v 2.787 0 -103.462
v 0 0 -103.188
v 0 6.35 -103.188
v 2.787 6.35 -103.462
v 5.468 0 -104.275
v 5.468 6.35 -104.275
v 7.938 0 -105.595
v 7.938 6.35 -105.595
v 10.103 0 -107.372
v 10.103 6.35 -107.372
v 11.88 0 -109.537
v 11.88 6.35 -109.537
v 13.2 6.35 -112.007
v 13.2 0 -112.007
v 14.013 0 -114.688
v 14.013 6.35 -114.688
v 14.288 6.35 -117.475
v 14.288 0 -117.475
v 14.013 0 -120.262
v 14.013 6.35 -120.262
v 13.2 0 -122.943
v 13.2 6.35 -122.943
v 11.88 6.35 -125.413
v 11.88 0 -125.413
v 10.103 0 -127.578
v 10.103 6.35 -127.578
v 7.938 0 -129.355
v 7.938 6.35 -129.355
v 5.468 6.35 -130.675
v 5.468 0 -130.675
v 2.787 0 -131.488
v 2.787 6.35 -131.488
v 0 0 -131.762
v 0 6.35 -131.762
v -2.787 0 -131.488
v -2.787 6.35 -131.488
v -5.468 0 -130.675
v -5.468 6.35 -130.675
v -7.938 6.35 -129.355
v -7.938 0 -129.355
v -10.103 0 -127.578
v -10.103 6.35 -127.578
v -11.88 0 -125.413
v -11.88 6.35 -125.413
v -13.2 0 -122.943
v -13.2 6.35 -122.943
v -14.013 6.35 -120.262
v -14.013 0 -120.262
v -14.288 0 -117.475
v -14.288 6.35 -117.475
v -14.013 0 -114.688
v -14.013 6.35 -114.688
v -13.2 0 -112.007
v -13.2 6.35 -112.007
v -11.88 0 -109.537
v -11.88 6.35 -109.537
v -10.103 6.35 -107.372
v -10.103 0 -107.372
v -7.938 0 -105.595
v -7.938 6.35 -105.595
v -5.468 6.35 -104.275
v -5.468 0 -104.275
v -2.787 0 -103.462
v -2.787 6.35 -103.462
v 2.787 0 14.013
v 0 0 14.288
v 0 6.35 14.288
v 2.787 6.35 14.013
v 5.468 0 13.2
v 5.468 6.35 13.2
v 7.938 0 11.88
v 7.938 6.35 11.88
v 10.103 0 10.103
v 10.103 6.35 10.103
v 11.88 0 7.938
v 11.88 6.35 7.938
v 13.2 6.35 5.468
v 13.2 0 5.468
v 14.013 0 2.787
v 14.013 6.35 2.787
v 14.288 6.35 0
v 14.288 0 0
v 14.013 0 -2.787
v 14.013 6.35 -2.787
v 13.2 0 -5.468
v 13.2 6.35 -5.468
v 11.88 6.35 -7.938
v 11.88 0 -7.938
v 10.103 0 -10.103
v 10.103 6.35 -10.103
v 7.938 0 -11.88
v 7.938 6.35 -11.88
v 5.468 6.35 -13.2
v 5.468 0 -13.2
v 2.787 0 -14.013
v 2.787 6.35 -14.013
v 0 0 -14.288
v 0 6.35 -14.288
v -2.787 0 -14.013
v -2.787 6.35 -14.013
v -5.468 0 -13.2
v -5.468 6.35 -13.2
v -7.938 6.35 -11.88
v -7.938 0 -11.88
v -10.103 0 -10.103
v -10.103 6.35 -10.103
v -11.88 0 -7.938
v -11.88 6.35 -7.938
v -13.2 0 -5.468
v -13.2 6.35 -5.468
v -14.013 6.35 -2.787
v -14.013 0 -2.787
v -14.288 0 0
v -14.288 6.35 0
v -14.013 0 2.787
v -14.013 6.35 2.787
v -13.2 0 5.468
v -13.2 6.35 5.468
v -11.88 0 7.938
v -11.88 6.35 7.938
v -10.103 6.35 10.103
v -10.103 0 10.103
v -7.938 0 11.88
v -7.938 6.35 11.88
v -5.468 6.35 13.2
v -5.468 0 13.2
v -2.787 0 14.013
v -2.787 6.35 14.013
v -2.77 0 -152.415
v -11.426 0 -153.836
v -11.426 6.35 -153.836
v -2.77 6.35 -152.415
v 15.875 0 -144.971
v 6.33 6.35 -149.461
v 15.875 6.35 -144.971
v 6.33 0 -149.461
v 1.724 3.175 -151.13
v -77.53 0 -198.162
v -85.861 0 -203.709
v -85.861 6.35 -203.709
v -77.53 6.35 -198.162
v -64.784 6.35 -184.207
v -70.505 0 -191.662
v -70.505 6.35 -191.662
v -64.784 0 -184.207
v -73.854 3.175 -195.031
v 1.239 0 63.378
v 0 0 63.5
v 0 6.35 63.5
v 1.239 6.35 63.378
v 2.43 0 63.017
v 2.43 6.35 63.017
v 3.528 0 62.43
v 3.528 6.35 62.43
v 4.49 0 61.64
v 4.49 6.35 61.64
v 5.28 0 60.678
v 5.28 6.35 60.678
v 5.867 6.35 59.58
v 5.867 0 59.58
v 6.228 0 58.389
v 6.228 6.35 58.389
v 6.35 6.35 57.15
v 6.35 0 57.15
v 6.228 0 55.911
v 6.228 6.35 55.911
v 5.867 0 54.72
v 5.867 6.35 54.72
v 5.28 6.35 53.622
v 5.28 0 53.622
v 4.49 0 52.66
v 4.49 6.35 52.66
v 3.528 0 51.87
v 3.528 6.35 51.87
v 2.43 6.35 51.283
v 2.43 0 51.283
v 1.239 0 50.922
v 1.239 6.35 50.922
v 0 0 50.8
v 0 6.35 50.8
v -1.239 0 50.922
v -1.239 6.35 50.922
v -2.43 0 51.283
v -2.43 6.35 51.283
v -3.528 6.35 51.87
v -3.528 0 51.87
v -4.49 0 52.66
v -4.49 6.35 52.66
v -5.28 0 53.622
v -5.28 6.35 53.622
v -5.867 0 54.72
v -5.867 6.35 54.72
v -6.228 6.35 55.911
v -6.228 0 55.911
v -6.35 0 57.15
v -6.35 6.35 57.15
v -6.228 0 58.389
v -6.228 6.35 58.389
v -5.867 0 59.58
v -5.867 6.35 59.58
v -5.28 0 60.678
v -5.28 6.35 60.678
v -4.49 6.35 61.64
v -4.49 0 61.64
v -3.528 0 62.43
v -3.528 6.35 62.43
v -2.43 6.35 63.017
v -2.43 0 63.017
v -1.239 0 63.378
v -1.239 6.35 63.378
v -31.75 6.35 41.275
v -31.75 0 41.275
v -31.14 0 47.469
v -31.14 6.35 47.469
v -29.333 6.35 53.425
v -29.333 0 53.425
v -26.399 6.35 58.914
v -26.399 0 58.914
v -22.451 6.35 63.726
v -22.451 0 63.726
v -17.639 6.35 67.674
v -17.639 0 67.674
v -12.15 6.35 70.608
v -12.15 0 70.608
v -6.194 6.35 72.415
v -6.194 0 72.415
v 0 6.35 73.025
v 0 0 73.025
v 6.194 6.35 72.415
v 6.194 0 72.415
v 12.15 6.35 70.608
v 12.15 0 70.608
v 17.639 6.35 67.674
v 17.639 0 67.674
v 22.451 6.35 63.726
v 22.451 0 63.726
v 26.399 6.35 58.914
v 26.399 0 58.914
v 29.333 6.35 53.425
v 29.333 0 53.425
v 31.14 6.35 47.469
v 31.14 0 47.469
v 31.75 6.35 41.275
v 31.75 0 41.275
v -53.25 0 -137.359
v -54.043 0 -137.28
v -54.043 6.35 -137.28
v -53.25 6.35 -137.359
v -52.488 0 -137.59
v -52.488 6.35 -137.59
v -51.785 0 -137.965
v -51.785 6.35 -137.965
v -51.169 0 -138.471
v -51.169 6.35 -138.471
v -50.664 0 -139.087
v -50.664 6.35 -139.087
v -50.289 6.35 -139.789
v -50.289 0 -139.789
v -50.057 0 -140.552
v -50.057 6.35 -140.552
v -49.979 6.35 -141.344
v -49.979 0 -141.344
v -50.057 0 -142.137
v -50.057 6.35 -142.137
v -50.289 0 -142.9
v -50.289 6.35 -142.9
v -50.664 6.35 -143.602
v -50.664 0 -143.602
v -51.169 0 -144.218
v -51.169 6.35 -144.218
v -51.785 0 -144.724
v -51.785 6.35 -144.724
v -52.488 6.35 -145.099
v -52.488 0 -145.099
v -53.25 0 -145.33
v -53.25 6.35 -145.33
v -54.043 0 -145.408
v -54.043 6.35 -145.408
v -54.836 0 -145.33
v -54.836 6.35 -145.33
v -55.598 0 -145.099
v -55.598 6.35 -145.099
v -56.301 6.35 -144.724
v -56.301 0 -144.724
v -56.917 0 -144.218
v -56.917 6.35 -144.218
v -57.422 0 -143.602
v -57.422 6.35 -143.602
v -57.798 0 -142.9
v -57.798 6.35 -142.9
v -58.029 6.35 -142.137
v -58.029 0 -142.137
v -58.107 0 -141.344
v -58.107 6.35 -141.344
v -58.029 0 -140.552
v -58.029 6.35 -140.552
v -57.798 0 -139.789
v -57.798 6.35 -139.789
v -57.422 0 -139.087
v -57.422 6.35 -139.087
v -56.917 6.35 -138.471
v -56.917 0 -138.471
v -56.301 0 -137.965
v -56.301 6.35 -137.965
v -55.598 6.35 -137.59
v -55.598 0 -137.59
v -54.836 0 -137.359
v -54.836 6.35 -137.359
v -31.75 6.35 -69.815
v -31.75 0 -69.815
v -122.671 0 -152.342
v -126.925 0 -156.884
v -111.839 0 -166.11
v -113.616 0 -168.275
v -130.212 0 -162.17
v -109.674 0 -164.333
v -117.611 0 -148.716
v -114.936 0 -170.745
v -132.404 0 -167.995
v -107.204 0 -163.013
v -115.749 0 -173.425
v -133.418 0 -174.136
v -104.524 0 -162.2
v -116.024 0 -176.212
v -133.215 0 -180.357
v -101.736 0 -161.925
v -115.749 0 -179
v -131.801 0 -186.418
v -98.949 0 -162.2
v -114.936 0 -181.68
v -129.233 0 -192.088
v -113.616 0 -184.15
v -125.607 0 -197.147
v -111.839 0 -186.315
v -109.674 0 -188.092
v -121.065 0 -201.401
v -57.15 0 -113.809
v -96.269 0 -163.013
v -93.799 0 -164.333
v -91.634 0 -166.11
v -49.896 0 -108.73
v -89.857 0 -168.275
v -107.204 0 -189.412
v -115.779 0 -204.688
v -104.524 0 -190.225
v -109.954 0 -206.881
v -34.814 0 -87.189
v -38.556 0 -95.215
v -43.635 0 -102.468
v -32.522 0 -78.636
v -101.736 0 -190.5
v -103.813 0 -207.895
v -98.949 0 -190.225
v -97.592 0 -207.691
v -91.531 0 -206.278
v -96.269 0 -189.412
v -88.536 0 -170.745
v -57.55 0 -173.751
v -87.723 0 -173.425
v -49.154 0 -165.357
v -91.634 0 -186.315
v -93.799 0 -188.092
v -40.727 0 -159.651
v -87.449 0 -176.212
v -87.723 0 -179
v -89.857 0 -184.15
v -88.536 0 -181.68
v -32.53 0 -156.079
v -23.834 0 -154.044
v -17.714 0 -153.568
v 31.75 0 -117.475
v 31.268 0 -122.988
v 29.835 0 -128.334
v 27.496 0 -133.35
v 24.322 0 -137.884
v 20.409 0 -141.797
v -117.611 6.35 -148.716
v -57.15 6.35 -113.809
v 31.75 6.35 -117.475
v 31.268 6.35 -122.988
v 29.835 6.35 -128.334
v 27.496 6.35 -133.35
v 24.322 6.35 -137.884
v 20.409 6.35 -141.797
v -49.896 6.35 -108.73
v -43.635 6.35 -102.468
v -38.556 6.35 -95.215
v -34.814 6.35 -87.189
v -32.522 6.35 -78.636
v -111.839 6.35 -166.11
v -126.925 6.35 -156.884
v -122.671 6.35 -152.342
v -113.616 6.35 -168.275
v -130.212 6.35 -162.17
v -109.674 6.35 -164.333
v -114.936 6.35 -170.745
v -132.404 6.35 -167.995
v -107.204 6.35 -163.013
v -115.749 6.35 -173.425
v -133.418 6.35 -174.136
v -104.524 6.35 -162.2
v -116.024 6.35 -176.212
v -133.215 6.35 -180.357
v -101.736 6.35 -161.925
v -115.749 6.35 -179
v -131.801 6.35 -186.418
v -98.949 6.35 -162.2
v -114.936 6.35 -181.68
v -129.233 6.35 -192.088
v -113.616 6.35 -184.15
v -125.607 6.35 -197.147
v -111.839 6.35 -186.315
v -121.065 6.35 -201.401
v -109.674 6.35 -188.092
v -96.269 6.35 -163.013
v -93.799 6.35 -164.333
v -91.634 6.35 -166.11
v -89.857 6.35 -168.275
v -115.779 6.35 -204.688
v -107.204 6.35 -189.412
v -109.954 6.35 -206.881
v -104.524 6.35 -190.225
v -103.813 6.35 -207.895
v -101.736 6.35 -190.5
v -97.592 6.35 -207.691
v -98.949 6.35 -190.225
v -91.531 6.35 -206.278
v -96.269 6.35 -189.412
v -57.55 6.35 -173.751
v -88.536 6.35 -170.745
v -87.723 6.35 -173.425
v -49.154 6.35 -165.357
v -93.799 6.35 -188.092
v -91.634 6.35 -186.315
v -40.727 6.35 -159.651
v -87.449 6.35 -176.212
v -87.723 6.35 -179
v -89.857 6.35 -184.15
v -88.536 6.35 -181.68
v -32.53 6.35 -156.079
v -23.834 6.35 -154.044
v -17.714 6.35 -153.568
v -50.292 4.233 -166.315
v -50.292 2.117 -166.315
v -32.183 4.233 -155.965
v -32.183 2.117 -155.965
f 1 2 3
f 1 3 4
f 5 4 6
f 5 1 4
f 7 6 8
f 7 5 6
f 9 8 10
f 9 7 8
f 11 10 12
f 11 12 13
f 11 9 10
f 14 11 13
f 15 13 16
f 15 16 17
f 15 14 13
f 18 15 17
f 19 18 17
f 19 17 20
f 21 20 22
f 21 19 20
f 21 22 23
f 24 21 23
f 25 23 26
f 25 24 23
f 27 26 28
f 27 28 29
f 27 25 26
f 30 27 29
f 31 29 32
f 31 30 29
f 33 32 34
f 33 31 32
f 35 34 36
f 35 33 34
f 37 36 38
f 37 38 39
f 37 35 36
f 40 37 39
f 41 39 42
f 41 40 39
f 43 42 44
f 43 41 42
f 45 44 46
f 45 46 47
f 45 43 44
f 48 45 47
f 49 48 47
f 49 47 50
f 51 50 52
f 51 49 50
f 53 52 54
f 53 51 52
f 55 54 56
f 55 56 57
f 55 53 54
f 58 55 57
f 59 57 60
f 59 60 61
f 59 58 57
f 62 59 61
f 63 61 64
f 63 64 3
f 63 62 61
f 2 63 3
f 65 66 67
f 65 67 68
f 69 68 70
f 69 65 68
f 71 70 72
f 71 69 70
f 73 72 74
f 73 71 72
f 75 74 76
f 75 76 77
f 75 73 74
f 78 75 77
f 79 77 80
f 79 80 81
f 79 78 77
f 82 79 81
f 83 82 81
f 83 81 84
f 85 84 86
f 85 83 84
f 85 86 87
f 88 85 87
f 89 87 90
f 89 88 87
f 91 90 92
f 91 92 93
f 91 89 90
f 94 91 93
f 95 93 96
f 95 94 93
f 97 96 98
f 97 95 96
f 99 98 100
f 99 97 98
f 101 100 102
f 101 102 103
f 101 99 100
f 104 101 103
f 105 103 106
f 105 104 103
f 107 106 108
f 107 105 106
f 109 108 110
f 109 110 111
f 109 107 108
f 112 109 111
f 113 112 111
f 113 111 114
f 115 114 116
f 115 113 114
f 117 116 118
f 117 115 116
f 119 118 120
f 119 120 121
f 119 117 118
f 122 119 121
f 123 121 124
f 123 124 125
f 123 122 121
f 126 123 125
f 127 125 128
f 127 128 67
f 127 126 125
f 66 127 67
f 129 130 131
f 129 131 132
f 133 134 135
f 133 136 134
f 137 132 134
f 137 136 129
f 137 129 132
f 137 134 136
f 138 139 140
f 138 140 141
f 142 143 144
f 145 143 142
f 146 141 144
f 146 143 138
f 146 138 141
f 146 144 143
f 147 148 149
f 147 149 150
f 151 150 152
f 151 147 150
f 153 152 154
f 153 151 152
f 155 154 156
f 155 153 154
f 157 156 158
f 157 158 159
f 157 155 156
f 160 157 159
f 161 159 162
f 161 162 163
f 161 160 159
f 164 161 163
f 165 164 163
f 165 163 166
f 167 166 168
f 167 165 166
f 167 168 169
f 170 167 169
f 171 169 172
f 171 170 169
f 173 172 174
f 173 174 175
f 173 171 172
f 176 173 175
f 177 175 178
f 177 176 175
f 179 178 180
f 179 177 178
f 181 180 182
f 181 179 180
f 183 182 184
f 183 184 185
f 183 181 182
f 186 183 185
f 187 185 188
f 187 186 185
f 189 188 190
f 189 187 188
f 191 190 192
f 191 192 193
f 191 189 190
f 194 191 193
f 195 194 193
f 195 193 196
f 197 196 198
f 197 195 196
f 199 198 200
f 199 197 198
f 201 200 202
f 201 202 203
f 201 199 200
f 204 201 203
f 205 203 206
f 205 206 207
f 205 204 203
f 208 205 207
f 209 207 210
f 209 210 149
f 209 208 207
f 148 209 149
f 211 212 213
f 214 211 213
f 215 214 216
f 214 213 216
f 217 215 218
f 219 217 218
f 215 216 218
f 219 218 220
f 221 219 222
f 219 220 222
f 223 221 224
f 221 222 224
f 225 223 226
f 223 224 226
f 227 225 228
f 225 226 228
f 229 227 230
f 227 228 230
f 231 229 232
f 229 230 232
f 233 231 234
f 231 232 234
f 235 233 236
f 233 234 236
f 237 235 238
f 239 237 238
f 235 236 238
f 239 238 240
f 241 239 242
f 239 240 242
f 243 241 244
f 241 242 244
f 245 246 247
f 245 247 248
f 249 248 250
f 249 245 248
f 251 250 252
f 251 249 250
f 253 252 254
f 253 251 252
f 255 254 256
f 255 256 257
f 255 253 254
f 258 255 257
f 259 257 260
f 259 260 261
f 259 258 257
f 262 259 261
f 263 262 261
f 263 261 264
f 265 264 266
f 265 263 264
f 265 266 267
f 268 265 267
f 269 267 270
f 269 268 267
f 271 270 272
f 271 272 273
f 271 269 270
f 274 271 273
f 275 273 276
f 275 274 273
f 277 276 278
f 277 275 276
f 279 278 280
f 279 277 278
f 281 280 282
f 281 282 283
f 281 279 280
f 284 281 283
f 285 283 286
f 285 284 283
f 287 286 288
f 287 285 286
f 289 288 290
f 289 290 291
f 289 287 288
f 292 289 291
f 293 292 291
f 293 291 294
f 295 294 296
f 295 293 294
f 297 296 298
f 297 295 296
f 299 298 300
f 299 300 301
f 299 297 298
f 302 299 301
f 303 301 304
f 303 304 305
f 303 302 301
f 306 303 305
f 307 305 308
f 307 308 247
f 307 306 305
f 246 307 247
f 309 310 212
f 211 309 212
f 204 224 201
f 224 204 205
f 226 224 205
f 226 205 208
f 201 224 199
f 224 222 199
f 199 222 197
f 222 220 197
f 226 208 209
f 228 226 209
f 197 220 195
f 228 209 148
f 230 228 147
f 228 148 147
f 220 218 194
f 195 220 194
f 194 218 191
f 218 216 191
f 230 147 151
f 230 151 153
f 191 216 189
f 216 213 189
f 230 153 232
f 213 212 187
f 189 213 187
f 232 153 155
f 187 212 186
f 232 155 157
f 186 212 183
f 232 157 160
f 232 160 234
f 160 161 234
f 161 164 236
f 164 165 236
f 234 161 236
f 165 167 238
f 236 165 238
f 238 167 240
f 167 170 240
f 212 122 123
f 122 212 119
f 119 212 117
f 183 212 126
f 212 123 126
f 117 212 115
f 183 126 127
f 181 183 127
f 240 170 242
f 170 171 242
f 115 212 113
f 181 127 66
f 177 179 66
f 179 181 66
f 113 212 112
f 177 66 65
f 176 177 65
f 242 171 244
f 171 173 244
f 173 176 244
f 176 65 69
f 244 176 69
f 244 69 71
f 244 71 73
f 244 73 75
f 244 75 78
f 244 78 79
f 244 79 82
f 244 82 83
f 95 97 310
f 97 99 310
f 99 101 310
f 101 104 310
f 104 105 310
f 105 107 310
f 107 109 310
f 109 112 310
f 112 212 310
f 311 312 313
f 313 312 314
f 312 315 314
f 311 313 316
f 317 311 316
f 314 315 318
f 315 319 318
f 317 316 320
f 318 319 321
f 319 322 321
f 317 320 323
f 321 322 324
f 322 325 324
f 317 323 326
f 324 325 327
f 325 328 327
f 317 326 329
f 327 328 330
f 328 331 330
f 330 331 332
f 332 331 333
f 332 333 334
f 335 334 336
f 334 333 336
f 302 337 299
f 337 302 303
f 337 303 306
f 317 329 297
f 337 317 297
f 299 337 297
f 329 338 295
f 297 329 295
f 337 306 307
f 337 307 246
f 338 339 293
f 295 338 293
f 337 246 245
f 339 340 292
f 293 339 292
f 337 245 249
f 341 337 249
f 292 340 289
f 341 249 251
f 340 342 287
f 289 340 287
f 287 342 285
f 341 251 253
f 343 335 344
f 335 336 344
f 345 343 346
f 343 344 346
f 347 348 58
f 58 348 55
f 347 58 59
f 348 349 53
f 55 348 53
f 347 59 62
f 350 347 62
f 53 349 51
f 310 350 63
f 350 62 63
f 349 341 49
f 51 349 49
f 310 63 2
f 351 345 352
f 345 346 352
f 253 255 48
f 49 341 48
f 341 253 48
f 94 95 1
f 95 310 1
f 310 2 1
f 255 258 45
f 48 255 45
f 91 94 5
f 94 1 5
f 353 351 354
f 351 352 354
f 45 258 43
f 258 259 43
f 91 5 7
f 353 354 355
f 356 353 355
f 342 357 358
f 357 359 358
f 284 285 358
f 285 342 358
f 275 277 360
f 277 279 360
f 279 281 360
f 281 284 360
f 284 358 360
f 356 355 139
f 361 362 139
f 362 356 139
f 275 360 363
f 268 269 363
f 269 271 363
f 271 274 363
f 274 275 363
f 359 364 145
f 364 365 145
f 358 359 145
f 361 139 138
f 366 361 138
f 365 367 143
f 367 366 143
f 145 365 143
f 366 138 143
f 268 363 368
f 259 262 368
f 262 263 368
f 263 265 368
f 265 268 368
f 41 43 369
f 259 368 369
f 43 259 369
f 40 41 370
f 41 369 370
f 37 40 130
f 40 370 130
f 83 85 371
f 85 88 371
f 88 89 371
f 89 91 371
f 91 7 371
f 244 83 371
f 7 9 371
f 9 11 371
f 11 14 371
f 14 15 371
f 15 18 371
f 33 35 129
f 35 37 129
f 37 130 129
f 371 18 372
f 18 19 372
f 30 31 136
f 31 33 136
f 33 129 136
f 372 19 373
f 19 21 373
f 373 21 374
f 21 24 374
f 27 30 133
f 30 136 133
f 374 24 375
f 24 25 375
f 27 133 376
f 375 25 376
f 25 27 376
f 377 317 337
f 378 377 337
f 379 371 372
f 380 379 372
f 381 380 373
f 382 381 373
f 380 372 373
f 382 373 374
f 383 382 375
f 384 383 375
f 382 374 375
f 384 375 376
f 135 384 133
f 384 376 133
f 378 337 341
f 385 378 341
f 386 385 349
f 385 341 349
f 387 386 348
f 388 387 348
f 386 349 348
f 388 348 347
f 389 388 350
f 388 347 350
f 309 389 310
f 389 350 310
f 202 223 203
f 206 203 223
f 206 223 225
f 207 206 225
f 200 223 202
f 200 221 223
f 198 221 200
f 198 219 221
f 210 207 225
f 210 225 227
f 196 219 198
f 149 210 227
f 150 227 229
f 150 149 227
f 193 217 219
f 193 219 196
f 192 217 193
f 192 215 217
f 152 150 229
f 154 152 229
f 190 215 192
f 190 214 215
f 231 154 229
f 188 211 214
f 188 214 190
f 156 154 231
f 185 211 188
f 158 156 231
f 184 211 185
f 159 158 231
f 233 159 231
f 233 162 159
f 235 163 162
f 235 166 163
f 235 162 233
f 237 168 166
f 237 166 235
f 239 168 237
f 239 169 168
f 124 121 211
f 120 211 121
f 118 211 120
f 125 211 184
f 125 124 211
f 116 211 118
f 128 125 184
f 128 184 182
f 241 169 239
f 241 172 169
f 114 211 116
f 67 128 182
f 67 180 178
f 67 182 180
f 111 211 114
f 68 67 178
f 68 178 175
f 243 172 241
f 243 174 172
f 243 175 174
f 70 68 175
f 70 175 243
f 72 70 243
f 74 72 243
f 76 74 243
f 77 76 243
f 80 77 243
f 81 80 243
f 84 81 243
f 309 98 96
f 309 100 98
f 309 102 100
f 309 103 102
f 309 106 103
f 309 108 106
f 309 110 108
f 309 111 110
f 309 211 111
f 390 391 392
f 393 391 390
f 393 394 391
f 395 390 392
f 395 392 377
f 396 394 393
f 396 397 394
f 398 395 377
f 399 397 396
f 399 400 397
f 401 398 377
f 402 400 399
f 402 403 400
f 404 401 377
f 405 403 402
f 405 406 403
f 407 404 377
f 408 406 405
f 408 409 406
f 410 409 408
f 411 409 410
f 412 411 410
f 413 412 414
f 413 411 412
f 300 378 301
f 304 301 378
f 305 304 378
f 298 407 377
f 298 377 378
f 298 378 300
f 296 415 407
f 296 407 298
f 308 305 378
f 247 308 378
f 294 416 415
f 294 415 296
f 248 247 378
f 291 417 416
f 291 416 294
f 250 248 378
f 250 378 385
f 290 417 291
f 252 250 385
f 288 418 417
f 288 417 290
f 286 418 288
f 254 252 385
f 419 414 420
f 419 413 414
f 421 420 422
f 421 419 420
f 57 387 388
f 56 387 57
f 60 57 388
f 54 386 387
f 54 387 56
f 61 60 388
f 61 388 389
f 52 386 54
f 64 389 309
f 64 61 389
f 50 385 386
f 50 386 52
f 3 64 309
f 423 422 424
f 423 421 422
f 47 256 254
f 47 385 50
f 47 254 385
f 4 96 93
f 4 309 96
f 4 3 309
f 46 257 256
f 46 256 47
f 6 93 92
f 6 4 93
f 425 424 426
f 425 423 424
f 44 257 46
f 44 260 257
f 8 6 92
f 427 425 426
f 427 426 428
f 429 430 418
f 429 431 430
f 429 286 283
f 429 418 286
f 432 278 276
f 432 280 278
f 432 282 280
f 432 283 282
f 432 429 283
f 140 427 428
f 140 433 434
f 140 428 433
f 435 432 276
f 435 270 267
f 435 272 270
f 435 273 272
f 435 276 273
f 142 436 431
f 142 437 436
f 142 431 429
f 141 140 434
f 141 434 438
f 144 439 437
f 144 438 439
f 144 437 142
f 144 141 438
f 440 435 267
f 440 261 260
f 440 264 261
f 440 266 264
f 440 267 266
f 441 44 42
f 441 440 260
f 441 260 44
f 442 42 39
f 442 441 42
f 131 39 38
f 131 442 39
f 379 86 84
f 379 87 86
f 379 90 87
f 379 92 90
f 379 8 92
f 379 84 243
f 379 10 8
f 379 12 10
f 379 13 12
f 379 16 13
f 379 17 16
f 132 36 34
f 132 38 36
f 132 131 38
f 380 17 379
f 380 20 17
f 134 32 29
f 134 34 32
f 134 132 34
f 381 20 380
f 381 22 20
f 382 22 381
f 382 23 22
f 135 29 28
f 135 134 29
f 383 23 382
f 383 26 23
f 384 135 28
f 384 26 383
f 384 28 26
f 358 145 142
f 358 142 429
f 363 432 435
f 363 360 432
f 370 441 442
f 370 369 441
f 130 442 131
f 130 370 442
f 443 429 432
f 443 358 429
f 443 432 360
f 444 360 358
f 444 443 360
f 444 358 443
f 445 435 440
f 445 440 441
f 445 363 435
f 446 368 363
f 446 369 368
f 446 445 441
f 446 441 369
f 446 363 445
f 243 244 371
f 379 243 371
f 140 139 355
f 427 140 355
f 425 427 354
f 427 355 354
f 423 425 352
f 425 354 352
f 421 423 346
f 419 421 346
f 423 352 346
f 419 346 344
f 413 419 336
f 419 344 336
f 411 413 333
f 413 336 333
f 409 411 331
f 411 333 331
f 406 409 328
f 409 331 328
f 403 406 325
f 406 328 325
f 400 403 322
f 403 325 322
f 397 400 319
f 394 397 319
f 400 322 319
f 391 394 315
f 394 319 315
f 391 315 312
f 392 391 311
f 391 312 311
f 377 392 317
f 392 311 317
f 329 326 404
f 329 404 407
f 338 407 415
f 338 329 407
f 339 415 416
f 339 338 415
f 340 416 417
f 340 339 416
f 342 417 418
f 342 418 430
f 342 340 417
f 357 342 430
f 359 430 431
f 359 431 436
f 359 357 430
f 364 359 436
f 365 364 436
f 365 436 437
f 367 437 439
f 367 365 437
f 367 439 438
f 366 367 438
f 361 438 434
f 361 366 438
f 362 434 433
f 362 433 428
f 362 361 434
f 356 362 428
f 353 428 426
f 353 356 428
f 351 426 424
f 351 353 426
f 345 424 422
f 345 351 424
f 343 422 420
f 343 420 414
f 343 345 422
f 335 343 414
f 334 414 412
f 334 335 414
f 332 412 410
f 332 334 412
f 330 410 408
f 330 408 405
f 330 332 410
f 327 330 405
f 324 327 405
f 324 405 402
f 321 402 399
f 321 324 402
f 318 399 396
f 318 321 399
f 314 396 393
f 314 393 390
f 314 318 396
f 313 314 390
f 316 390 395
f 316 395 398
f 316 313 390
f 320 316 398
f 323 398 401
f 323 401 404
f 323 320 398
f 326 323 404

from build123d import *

# Parameters (mm, degrees)
SKETCH2_R           = 14.2875
SKETCH2_R_2         = 6.35
SKETCH2_R_3         = 4.064
BOSS_EXTRUDE1_DEPTH = 6.35


with BuildPart() as part:
    # Sketch2 → Boss-Extrude1 (new body)
    with BuildSketch(Plane(origin=(0, 0, 0), x_dir=(1, 0, 0), z_dir=(0, 1, 0))):
        with BuildLine():
            Line((31.75, 20.031971953), (31.75, 117.475))
            ThreePointArc((31.75, 117.475), (27.49630657, 133.35), (15.875, 144.97130657))
            add(Edge.make_bspline(
                [(-11.426385325, 153.835795689), (1.224450482, 152.855976047), (15.875, 144.97130657)],
                knots=[0, 0, 0, 1, 1, 1], degree=2))
            add(Edge.make_bspline(
                [(-64.783506655, 184.207168681), (-52.423507121, 162.771572898), (-33.18367174, 151.627706727), (-11.426385325, 153.835795689)],
                knots=[0, 0, 0, 0, 1, 1, 1, 1], degree=3))
            add(Edge.make_bspline(
                [(-85.86133431, 203.70880657), (-72.386286962, 196.104383794), (-64.783506655, 184.207168681)],
                knots=[0, 0, 0, 1, 1, 1], degree=2))
            ThreePointArc((-85.86133431, 203.70880657), (-129.23264088, 192.0875), (-117.61133431, 148.71619343))
            Line((-117.61133431, 148.71619343), (-57.15, 113.808825791))
            ThreePointArc((-57.15, 113.808825791), (-38.555909488, 95.214735278), (-31.75, 69.814735278))
            Line((-31.75, 69.814735278), (-31.75, -41.275))
            ThreePointArc((-31.75, -41.275), (0, -73.025), (31.75, -41.275))
            Line((31.75, -41.275), (31.75, 20.031971953))
        make_face()
        with Locations(Location((0, 0, 0), (0, 0, 270))):
            Circle(SKETCH2_R, mode=Mode.SUBTRACT)
        with Locations(Location((0, 117.475, 0), (0, 0, 270))):
            Circle(SKETCH2_R, mode=Mode.SUBTRACT)
        with Locations(Location((-101.73633431, 176.2125, 0), (0, 0, 270))):
            Circle(SKETCH2_R, mode=Mode.SUBTRACT)
        with Locations(Location((0, -57.15, 0), (0, 0, 270))):
            Circle(SKETCH2_R_2, mode=Mode.SUBTRACT)
        with Locations(Location((-54.043167155, 141.344488686, 0), (0, 0, 270))):
            Circle(SKETCH2_R_3, mode=Mode.SUBTRACT)
    extrude(amount=BOSS_EXTRUDE1_DEPTH)


solid = part.part
